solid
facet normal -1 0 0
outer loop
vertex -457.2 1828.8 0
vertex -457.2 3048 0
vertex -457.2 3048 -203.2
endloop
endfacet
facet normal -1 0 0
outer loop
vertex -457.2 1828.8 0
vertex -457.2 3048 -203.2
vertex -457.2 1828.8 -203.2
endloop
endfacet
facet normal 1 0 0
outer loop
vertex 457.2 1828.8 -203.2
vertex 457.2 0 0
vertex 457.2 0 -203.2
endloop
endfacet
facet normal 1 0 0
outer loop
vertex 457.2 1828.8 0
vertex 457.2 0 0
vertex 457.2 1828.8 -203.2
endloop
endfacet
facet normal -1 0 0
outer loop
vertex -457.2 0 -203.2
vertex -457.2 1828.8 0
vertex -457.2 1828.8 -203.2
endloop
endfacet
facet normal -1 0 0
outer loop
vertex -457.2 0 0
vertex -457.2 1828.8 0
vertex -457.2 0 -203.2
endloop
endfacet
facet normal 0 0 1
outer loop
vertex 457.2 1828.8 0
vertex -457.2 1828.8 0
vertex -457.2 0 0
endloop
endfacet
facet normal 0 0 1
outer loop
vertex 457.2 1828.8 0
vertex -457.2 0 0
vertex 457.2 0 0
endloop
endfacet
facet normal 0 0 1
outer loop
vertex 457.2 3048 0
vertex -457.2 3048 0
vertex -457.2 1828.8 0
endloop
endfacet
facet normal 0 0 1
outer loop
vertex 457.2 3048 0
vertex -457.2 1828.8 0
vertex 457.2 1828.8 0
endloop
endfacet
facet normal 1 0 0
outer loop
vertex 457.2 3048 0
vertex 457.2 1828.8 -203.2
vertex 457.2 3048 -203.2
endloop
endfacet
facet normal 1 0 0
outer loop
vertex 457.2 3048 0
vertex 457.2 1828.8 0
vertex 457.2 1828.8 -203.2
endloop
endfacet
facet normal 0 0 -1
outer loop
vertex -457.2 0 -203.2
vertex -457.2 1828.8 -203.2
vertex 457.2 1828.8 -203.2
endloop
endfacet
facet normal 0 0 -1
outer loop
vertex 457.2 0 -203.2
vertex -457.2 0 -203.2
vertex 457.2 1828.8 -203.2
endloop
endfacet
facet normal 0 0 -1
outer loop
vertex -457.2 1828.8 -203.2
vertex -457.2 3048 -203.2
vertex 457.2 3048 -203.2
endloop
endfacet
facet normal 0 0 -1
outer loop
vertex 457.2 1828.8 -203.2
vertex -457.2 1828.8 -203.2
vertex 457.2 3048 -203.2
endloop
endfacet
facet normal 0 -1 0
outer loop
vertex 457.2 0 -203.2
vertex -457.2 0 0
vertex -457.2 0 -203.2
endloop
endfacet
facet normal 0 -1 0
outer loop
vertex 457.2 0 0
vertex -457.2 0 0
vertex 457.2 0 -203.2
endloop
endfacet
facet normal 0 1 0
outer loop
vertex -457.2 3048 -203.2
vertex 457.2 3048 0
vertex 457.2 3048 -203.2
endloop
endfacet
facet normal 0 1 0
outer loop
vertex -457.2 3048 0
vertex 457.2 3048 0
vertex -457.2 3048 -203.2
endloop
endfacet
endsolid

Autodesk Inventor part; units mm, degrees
ref_plane "PLANE IN" through (0, 0, 0) normal (0, 1, 0) x (-1, 0, 0)
ref_plane "PLANE OUT" through (0, 3048, 0) normal (0, 1, 0) x (-1, 0, 0)
ref_plane "PLANE CTR" through (0, 0, 0) normal (1, 0, 0) x (0, 1, 0)
ref_plane "PLANE RH" through (457.2, 0, 0) normal (1, 0, 0) x (0, 1, 0)
ref_plane "PLANE LH" through (-457.2, 0, 0) normal (1, 0, 0) x (0, 1, 0)
ref_plane "PLANE TOP" through (0, 0, 0) normal (0, 0, 1) x (1, 0, 0)
ref_plane "PLANE BOT" through (0, 0, -203.2) normal (0, 0, 1) x (1, 0, 0)
ref_plane "PLANE HANDLE RH" through (558.8, 0, 0) normal (1, 0, 0) x (0, 1, 0)
ref_plane "PLANE HANDLE LH" through (-558.8, 0, 0) normal (1, 0, 0) x (0, 1, 0)
ref_plane "PLANE HANDLE IN" through (0, 63.5, 0) normal (0, 1, 0) x (-1, 0, 0)
ref_plane "PLANE HANDLE OUT" through (0, 2984.5, 0) normal (0, 1, 0) x (-1, 0, 0)
ref_plane "PLANE HANDLE TOP" through (0, 0, -63.5) normal (0, 0, 1) x (1, 0, 0)
sketch "SKETCH BODY" plane through (0, 0, 0) normal (0, 0, 1) x (1, 0, 0)
  line L0 (-457.2, 0) -> (457.2, 0)
  line L1 (457.2, 0) -> (457.2, 3048)
  line L2 (457.2, 3048) -> (-457.2, 3048)
  line L3 (-457.2, 3048) -> (-457.2, 0)
  line L4 (-640.08, 0) -> (640.08, 0) projected
  line L5 (-640.08, 3048) -> (640.08, 3048) projected
  line L6 (457.2, 1828.8) -> (457.2, -304.8) projected
  line L7 (-457.2, 1828.8) -> (-457.2, -304.8) projected
extrude "EXT BODY" add sketch "SKETCH BODY" against normal blind 203.2
sketch "SKETCH HANDLE DIA" plane through (457.2, 0, 0) normal (1, 0, 0) x (0, 1, 0)
  line L0 (45.72, -63.5) -> (81.28, -63.5) projected
  line L1 (63.5, -45.72) -> (63.5, -81.28) projected
  circle A0 centre (63.5, -63.5) radius 12.7
  dimension "d79" = 25.4
sketch "SKETCH HANDLE PATH" plane through (0, 0, -63.5) normal (0, 0, 1) x (1, 0, 0)
  line L0 (558.8, 1739.9) -> (558.8, -215.9) projected
  line L1 (457.2, 1739.9) -> (457.2, -215.9) projected
  line L2 (436.88, 63.5) -> (579.12, 63.5) projected
  line L3 (436.88, 2984.5) -> (579.12, 2984.5) projected
  line L4 (457.2, 63.5) -> (558.8, 63.5)
  line L5 (558.8, 63.5) -> (558.8, 2984.5)
  line L6 (558.8, 2984.5) -> (457.2, 2984.5)
  line L7 (457.2, 2984.5) -> (457.2, 63.5) construction
feature "SWP HANDLE" [suppressed]
mirror "MIR HANDLE" [suppressed]
equation "\"d76\" = HEIGHT"
equation "\"PLANE_OUT\" = LENGTH"
equation "\"PLANE_RH\" = 0.5 * WIDTH"
equation "\"PLANE_LH\" = -0.5 * WIDTH"
equation "\"PLANE_BOT\" = -HEIGHT"
equation "\"PLANE_HANDLE_RH\" = HANDLE_OFFSET_CTR"
equation "\"PLANE_HANDLE_LH\" = -HANDLE_OFFSET_CTR"
equation "\"PLANE_HANDLE_IN\" = HANDLE_OFFSET_END"
equation "\"PLANE_HANDLE_OUT\" = LENGTH - HANDLE_OFFSET_END"
equation "\"PLANE_HANDLE_TOP\" = -HANDLE_OFFSET_TOP"
equation "\"LENGTH\" = 3048"
equation "\"WIDTH\" = 914.4"
equation "\"HEIGHT\" = 203.2"
equation "\"HANDLE_GAP\" = 101.6"
equation "\"HANDLE_OFFSET_CTR\" = 0.5 * WIDTH + HANDLE_GAP"
equation "\"HANDLE_OFFSET_END\" = 63.5"
equation "\"HANDLE_OFFSET_TOP\" = 63.5"
properties part number "ATQ-36-120-N"
